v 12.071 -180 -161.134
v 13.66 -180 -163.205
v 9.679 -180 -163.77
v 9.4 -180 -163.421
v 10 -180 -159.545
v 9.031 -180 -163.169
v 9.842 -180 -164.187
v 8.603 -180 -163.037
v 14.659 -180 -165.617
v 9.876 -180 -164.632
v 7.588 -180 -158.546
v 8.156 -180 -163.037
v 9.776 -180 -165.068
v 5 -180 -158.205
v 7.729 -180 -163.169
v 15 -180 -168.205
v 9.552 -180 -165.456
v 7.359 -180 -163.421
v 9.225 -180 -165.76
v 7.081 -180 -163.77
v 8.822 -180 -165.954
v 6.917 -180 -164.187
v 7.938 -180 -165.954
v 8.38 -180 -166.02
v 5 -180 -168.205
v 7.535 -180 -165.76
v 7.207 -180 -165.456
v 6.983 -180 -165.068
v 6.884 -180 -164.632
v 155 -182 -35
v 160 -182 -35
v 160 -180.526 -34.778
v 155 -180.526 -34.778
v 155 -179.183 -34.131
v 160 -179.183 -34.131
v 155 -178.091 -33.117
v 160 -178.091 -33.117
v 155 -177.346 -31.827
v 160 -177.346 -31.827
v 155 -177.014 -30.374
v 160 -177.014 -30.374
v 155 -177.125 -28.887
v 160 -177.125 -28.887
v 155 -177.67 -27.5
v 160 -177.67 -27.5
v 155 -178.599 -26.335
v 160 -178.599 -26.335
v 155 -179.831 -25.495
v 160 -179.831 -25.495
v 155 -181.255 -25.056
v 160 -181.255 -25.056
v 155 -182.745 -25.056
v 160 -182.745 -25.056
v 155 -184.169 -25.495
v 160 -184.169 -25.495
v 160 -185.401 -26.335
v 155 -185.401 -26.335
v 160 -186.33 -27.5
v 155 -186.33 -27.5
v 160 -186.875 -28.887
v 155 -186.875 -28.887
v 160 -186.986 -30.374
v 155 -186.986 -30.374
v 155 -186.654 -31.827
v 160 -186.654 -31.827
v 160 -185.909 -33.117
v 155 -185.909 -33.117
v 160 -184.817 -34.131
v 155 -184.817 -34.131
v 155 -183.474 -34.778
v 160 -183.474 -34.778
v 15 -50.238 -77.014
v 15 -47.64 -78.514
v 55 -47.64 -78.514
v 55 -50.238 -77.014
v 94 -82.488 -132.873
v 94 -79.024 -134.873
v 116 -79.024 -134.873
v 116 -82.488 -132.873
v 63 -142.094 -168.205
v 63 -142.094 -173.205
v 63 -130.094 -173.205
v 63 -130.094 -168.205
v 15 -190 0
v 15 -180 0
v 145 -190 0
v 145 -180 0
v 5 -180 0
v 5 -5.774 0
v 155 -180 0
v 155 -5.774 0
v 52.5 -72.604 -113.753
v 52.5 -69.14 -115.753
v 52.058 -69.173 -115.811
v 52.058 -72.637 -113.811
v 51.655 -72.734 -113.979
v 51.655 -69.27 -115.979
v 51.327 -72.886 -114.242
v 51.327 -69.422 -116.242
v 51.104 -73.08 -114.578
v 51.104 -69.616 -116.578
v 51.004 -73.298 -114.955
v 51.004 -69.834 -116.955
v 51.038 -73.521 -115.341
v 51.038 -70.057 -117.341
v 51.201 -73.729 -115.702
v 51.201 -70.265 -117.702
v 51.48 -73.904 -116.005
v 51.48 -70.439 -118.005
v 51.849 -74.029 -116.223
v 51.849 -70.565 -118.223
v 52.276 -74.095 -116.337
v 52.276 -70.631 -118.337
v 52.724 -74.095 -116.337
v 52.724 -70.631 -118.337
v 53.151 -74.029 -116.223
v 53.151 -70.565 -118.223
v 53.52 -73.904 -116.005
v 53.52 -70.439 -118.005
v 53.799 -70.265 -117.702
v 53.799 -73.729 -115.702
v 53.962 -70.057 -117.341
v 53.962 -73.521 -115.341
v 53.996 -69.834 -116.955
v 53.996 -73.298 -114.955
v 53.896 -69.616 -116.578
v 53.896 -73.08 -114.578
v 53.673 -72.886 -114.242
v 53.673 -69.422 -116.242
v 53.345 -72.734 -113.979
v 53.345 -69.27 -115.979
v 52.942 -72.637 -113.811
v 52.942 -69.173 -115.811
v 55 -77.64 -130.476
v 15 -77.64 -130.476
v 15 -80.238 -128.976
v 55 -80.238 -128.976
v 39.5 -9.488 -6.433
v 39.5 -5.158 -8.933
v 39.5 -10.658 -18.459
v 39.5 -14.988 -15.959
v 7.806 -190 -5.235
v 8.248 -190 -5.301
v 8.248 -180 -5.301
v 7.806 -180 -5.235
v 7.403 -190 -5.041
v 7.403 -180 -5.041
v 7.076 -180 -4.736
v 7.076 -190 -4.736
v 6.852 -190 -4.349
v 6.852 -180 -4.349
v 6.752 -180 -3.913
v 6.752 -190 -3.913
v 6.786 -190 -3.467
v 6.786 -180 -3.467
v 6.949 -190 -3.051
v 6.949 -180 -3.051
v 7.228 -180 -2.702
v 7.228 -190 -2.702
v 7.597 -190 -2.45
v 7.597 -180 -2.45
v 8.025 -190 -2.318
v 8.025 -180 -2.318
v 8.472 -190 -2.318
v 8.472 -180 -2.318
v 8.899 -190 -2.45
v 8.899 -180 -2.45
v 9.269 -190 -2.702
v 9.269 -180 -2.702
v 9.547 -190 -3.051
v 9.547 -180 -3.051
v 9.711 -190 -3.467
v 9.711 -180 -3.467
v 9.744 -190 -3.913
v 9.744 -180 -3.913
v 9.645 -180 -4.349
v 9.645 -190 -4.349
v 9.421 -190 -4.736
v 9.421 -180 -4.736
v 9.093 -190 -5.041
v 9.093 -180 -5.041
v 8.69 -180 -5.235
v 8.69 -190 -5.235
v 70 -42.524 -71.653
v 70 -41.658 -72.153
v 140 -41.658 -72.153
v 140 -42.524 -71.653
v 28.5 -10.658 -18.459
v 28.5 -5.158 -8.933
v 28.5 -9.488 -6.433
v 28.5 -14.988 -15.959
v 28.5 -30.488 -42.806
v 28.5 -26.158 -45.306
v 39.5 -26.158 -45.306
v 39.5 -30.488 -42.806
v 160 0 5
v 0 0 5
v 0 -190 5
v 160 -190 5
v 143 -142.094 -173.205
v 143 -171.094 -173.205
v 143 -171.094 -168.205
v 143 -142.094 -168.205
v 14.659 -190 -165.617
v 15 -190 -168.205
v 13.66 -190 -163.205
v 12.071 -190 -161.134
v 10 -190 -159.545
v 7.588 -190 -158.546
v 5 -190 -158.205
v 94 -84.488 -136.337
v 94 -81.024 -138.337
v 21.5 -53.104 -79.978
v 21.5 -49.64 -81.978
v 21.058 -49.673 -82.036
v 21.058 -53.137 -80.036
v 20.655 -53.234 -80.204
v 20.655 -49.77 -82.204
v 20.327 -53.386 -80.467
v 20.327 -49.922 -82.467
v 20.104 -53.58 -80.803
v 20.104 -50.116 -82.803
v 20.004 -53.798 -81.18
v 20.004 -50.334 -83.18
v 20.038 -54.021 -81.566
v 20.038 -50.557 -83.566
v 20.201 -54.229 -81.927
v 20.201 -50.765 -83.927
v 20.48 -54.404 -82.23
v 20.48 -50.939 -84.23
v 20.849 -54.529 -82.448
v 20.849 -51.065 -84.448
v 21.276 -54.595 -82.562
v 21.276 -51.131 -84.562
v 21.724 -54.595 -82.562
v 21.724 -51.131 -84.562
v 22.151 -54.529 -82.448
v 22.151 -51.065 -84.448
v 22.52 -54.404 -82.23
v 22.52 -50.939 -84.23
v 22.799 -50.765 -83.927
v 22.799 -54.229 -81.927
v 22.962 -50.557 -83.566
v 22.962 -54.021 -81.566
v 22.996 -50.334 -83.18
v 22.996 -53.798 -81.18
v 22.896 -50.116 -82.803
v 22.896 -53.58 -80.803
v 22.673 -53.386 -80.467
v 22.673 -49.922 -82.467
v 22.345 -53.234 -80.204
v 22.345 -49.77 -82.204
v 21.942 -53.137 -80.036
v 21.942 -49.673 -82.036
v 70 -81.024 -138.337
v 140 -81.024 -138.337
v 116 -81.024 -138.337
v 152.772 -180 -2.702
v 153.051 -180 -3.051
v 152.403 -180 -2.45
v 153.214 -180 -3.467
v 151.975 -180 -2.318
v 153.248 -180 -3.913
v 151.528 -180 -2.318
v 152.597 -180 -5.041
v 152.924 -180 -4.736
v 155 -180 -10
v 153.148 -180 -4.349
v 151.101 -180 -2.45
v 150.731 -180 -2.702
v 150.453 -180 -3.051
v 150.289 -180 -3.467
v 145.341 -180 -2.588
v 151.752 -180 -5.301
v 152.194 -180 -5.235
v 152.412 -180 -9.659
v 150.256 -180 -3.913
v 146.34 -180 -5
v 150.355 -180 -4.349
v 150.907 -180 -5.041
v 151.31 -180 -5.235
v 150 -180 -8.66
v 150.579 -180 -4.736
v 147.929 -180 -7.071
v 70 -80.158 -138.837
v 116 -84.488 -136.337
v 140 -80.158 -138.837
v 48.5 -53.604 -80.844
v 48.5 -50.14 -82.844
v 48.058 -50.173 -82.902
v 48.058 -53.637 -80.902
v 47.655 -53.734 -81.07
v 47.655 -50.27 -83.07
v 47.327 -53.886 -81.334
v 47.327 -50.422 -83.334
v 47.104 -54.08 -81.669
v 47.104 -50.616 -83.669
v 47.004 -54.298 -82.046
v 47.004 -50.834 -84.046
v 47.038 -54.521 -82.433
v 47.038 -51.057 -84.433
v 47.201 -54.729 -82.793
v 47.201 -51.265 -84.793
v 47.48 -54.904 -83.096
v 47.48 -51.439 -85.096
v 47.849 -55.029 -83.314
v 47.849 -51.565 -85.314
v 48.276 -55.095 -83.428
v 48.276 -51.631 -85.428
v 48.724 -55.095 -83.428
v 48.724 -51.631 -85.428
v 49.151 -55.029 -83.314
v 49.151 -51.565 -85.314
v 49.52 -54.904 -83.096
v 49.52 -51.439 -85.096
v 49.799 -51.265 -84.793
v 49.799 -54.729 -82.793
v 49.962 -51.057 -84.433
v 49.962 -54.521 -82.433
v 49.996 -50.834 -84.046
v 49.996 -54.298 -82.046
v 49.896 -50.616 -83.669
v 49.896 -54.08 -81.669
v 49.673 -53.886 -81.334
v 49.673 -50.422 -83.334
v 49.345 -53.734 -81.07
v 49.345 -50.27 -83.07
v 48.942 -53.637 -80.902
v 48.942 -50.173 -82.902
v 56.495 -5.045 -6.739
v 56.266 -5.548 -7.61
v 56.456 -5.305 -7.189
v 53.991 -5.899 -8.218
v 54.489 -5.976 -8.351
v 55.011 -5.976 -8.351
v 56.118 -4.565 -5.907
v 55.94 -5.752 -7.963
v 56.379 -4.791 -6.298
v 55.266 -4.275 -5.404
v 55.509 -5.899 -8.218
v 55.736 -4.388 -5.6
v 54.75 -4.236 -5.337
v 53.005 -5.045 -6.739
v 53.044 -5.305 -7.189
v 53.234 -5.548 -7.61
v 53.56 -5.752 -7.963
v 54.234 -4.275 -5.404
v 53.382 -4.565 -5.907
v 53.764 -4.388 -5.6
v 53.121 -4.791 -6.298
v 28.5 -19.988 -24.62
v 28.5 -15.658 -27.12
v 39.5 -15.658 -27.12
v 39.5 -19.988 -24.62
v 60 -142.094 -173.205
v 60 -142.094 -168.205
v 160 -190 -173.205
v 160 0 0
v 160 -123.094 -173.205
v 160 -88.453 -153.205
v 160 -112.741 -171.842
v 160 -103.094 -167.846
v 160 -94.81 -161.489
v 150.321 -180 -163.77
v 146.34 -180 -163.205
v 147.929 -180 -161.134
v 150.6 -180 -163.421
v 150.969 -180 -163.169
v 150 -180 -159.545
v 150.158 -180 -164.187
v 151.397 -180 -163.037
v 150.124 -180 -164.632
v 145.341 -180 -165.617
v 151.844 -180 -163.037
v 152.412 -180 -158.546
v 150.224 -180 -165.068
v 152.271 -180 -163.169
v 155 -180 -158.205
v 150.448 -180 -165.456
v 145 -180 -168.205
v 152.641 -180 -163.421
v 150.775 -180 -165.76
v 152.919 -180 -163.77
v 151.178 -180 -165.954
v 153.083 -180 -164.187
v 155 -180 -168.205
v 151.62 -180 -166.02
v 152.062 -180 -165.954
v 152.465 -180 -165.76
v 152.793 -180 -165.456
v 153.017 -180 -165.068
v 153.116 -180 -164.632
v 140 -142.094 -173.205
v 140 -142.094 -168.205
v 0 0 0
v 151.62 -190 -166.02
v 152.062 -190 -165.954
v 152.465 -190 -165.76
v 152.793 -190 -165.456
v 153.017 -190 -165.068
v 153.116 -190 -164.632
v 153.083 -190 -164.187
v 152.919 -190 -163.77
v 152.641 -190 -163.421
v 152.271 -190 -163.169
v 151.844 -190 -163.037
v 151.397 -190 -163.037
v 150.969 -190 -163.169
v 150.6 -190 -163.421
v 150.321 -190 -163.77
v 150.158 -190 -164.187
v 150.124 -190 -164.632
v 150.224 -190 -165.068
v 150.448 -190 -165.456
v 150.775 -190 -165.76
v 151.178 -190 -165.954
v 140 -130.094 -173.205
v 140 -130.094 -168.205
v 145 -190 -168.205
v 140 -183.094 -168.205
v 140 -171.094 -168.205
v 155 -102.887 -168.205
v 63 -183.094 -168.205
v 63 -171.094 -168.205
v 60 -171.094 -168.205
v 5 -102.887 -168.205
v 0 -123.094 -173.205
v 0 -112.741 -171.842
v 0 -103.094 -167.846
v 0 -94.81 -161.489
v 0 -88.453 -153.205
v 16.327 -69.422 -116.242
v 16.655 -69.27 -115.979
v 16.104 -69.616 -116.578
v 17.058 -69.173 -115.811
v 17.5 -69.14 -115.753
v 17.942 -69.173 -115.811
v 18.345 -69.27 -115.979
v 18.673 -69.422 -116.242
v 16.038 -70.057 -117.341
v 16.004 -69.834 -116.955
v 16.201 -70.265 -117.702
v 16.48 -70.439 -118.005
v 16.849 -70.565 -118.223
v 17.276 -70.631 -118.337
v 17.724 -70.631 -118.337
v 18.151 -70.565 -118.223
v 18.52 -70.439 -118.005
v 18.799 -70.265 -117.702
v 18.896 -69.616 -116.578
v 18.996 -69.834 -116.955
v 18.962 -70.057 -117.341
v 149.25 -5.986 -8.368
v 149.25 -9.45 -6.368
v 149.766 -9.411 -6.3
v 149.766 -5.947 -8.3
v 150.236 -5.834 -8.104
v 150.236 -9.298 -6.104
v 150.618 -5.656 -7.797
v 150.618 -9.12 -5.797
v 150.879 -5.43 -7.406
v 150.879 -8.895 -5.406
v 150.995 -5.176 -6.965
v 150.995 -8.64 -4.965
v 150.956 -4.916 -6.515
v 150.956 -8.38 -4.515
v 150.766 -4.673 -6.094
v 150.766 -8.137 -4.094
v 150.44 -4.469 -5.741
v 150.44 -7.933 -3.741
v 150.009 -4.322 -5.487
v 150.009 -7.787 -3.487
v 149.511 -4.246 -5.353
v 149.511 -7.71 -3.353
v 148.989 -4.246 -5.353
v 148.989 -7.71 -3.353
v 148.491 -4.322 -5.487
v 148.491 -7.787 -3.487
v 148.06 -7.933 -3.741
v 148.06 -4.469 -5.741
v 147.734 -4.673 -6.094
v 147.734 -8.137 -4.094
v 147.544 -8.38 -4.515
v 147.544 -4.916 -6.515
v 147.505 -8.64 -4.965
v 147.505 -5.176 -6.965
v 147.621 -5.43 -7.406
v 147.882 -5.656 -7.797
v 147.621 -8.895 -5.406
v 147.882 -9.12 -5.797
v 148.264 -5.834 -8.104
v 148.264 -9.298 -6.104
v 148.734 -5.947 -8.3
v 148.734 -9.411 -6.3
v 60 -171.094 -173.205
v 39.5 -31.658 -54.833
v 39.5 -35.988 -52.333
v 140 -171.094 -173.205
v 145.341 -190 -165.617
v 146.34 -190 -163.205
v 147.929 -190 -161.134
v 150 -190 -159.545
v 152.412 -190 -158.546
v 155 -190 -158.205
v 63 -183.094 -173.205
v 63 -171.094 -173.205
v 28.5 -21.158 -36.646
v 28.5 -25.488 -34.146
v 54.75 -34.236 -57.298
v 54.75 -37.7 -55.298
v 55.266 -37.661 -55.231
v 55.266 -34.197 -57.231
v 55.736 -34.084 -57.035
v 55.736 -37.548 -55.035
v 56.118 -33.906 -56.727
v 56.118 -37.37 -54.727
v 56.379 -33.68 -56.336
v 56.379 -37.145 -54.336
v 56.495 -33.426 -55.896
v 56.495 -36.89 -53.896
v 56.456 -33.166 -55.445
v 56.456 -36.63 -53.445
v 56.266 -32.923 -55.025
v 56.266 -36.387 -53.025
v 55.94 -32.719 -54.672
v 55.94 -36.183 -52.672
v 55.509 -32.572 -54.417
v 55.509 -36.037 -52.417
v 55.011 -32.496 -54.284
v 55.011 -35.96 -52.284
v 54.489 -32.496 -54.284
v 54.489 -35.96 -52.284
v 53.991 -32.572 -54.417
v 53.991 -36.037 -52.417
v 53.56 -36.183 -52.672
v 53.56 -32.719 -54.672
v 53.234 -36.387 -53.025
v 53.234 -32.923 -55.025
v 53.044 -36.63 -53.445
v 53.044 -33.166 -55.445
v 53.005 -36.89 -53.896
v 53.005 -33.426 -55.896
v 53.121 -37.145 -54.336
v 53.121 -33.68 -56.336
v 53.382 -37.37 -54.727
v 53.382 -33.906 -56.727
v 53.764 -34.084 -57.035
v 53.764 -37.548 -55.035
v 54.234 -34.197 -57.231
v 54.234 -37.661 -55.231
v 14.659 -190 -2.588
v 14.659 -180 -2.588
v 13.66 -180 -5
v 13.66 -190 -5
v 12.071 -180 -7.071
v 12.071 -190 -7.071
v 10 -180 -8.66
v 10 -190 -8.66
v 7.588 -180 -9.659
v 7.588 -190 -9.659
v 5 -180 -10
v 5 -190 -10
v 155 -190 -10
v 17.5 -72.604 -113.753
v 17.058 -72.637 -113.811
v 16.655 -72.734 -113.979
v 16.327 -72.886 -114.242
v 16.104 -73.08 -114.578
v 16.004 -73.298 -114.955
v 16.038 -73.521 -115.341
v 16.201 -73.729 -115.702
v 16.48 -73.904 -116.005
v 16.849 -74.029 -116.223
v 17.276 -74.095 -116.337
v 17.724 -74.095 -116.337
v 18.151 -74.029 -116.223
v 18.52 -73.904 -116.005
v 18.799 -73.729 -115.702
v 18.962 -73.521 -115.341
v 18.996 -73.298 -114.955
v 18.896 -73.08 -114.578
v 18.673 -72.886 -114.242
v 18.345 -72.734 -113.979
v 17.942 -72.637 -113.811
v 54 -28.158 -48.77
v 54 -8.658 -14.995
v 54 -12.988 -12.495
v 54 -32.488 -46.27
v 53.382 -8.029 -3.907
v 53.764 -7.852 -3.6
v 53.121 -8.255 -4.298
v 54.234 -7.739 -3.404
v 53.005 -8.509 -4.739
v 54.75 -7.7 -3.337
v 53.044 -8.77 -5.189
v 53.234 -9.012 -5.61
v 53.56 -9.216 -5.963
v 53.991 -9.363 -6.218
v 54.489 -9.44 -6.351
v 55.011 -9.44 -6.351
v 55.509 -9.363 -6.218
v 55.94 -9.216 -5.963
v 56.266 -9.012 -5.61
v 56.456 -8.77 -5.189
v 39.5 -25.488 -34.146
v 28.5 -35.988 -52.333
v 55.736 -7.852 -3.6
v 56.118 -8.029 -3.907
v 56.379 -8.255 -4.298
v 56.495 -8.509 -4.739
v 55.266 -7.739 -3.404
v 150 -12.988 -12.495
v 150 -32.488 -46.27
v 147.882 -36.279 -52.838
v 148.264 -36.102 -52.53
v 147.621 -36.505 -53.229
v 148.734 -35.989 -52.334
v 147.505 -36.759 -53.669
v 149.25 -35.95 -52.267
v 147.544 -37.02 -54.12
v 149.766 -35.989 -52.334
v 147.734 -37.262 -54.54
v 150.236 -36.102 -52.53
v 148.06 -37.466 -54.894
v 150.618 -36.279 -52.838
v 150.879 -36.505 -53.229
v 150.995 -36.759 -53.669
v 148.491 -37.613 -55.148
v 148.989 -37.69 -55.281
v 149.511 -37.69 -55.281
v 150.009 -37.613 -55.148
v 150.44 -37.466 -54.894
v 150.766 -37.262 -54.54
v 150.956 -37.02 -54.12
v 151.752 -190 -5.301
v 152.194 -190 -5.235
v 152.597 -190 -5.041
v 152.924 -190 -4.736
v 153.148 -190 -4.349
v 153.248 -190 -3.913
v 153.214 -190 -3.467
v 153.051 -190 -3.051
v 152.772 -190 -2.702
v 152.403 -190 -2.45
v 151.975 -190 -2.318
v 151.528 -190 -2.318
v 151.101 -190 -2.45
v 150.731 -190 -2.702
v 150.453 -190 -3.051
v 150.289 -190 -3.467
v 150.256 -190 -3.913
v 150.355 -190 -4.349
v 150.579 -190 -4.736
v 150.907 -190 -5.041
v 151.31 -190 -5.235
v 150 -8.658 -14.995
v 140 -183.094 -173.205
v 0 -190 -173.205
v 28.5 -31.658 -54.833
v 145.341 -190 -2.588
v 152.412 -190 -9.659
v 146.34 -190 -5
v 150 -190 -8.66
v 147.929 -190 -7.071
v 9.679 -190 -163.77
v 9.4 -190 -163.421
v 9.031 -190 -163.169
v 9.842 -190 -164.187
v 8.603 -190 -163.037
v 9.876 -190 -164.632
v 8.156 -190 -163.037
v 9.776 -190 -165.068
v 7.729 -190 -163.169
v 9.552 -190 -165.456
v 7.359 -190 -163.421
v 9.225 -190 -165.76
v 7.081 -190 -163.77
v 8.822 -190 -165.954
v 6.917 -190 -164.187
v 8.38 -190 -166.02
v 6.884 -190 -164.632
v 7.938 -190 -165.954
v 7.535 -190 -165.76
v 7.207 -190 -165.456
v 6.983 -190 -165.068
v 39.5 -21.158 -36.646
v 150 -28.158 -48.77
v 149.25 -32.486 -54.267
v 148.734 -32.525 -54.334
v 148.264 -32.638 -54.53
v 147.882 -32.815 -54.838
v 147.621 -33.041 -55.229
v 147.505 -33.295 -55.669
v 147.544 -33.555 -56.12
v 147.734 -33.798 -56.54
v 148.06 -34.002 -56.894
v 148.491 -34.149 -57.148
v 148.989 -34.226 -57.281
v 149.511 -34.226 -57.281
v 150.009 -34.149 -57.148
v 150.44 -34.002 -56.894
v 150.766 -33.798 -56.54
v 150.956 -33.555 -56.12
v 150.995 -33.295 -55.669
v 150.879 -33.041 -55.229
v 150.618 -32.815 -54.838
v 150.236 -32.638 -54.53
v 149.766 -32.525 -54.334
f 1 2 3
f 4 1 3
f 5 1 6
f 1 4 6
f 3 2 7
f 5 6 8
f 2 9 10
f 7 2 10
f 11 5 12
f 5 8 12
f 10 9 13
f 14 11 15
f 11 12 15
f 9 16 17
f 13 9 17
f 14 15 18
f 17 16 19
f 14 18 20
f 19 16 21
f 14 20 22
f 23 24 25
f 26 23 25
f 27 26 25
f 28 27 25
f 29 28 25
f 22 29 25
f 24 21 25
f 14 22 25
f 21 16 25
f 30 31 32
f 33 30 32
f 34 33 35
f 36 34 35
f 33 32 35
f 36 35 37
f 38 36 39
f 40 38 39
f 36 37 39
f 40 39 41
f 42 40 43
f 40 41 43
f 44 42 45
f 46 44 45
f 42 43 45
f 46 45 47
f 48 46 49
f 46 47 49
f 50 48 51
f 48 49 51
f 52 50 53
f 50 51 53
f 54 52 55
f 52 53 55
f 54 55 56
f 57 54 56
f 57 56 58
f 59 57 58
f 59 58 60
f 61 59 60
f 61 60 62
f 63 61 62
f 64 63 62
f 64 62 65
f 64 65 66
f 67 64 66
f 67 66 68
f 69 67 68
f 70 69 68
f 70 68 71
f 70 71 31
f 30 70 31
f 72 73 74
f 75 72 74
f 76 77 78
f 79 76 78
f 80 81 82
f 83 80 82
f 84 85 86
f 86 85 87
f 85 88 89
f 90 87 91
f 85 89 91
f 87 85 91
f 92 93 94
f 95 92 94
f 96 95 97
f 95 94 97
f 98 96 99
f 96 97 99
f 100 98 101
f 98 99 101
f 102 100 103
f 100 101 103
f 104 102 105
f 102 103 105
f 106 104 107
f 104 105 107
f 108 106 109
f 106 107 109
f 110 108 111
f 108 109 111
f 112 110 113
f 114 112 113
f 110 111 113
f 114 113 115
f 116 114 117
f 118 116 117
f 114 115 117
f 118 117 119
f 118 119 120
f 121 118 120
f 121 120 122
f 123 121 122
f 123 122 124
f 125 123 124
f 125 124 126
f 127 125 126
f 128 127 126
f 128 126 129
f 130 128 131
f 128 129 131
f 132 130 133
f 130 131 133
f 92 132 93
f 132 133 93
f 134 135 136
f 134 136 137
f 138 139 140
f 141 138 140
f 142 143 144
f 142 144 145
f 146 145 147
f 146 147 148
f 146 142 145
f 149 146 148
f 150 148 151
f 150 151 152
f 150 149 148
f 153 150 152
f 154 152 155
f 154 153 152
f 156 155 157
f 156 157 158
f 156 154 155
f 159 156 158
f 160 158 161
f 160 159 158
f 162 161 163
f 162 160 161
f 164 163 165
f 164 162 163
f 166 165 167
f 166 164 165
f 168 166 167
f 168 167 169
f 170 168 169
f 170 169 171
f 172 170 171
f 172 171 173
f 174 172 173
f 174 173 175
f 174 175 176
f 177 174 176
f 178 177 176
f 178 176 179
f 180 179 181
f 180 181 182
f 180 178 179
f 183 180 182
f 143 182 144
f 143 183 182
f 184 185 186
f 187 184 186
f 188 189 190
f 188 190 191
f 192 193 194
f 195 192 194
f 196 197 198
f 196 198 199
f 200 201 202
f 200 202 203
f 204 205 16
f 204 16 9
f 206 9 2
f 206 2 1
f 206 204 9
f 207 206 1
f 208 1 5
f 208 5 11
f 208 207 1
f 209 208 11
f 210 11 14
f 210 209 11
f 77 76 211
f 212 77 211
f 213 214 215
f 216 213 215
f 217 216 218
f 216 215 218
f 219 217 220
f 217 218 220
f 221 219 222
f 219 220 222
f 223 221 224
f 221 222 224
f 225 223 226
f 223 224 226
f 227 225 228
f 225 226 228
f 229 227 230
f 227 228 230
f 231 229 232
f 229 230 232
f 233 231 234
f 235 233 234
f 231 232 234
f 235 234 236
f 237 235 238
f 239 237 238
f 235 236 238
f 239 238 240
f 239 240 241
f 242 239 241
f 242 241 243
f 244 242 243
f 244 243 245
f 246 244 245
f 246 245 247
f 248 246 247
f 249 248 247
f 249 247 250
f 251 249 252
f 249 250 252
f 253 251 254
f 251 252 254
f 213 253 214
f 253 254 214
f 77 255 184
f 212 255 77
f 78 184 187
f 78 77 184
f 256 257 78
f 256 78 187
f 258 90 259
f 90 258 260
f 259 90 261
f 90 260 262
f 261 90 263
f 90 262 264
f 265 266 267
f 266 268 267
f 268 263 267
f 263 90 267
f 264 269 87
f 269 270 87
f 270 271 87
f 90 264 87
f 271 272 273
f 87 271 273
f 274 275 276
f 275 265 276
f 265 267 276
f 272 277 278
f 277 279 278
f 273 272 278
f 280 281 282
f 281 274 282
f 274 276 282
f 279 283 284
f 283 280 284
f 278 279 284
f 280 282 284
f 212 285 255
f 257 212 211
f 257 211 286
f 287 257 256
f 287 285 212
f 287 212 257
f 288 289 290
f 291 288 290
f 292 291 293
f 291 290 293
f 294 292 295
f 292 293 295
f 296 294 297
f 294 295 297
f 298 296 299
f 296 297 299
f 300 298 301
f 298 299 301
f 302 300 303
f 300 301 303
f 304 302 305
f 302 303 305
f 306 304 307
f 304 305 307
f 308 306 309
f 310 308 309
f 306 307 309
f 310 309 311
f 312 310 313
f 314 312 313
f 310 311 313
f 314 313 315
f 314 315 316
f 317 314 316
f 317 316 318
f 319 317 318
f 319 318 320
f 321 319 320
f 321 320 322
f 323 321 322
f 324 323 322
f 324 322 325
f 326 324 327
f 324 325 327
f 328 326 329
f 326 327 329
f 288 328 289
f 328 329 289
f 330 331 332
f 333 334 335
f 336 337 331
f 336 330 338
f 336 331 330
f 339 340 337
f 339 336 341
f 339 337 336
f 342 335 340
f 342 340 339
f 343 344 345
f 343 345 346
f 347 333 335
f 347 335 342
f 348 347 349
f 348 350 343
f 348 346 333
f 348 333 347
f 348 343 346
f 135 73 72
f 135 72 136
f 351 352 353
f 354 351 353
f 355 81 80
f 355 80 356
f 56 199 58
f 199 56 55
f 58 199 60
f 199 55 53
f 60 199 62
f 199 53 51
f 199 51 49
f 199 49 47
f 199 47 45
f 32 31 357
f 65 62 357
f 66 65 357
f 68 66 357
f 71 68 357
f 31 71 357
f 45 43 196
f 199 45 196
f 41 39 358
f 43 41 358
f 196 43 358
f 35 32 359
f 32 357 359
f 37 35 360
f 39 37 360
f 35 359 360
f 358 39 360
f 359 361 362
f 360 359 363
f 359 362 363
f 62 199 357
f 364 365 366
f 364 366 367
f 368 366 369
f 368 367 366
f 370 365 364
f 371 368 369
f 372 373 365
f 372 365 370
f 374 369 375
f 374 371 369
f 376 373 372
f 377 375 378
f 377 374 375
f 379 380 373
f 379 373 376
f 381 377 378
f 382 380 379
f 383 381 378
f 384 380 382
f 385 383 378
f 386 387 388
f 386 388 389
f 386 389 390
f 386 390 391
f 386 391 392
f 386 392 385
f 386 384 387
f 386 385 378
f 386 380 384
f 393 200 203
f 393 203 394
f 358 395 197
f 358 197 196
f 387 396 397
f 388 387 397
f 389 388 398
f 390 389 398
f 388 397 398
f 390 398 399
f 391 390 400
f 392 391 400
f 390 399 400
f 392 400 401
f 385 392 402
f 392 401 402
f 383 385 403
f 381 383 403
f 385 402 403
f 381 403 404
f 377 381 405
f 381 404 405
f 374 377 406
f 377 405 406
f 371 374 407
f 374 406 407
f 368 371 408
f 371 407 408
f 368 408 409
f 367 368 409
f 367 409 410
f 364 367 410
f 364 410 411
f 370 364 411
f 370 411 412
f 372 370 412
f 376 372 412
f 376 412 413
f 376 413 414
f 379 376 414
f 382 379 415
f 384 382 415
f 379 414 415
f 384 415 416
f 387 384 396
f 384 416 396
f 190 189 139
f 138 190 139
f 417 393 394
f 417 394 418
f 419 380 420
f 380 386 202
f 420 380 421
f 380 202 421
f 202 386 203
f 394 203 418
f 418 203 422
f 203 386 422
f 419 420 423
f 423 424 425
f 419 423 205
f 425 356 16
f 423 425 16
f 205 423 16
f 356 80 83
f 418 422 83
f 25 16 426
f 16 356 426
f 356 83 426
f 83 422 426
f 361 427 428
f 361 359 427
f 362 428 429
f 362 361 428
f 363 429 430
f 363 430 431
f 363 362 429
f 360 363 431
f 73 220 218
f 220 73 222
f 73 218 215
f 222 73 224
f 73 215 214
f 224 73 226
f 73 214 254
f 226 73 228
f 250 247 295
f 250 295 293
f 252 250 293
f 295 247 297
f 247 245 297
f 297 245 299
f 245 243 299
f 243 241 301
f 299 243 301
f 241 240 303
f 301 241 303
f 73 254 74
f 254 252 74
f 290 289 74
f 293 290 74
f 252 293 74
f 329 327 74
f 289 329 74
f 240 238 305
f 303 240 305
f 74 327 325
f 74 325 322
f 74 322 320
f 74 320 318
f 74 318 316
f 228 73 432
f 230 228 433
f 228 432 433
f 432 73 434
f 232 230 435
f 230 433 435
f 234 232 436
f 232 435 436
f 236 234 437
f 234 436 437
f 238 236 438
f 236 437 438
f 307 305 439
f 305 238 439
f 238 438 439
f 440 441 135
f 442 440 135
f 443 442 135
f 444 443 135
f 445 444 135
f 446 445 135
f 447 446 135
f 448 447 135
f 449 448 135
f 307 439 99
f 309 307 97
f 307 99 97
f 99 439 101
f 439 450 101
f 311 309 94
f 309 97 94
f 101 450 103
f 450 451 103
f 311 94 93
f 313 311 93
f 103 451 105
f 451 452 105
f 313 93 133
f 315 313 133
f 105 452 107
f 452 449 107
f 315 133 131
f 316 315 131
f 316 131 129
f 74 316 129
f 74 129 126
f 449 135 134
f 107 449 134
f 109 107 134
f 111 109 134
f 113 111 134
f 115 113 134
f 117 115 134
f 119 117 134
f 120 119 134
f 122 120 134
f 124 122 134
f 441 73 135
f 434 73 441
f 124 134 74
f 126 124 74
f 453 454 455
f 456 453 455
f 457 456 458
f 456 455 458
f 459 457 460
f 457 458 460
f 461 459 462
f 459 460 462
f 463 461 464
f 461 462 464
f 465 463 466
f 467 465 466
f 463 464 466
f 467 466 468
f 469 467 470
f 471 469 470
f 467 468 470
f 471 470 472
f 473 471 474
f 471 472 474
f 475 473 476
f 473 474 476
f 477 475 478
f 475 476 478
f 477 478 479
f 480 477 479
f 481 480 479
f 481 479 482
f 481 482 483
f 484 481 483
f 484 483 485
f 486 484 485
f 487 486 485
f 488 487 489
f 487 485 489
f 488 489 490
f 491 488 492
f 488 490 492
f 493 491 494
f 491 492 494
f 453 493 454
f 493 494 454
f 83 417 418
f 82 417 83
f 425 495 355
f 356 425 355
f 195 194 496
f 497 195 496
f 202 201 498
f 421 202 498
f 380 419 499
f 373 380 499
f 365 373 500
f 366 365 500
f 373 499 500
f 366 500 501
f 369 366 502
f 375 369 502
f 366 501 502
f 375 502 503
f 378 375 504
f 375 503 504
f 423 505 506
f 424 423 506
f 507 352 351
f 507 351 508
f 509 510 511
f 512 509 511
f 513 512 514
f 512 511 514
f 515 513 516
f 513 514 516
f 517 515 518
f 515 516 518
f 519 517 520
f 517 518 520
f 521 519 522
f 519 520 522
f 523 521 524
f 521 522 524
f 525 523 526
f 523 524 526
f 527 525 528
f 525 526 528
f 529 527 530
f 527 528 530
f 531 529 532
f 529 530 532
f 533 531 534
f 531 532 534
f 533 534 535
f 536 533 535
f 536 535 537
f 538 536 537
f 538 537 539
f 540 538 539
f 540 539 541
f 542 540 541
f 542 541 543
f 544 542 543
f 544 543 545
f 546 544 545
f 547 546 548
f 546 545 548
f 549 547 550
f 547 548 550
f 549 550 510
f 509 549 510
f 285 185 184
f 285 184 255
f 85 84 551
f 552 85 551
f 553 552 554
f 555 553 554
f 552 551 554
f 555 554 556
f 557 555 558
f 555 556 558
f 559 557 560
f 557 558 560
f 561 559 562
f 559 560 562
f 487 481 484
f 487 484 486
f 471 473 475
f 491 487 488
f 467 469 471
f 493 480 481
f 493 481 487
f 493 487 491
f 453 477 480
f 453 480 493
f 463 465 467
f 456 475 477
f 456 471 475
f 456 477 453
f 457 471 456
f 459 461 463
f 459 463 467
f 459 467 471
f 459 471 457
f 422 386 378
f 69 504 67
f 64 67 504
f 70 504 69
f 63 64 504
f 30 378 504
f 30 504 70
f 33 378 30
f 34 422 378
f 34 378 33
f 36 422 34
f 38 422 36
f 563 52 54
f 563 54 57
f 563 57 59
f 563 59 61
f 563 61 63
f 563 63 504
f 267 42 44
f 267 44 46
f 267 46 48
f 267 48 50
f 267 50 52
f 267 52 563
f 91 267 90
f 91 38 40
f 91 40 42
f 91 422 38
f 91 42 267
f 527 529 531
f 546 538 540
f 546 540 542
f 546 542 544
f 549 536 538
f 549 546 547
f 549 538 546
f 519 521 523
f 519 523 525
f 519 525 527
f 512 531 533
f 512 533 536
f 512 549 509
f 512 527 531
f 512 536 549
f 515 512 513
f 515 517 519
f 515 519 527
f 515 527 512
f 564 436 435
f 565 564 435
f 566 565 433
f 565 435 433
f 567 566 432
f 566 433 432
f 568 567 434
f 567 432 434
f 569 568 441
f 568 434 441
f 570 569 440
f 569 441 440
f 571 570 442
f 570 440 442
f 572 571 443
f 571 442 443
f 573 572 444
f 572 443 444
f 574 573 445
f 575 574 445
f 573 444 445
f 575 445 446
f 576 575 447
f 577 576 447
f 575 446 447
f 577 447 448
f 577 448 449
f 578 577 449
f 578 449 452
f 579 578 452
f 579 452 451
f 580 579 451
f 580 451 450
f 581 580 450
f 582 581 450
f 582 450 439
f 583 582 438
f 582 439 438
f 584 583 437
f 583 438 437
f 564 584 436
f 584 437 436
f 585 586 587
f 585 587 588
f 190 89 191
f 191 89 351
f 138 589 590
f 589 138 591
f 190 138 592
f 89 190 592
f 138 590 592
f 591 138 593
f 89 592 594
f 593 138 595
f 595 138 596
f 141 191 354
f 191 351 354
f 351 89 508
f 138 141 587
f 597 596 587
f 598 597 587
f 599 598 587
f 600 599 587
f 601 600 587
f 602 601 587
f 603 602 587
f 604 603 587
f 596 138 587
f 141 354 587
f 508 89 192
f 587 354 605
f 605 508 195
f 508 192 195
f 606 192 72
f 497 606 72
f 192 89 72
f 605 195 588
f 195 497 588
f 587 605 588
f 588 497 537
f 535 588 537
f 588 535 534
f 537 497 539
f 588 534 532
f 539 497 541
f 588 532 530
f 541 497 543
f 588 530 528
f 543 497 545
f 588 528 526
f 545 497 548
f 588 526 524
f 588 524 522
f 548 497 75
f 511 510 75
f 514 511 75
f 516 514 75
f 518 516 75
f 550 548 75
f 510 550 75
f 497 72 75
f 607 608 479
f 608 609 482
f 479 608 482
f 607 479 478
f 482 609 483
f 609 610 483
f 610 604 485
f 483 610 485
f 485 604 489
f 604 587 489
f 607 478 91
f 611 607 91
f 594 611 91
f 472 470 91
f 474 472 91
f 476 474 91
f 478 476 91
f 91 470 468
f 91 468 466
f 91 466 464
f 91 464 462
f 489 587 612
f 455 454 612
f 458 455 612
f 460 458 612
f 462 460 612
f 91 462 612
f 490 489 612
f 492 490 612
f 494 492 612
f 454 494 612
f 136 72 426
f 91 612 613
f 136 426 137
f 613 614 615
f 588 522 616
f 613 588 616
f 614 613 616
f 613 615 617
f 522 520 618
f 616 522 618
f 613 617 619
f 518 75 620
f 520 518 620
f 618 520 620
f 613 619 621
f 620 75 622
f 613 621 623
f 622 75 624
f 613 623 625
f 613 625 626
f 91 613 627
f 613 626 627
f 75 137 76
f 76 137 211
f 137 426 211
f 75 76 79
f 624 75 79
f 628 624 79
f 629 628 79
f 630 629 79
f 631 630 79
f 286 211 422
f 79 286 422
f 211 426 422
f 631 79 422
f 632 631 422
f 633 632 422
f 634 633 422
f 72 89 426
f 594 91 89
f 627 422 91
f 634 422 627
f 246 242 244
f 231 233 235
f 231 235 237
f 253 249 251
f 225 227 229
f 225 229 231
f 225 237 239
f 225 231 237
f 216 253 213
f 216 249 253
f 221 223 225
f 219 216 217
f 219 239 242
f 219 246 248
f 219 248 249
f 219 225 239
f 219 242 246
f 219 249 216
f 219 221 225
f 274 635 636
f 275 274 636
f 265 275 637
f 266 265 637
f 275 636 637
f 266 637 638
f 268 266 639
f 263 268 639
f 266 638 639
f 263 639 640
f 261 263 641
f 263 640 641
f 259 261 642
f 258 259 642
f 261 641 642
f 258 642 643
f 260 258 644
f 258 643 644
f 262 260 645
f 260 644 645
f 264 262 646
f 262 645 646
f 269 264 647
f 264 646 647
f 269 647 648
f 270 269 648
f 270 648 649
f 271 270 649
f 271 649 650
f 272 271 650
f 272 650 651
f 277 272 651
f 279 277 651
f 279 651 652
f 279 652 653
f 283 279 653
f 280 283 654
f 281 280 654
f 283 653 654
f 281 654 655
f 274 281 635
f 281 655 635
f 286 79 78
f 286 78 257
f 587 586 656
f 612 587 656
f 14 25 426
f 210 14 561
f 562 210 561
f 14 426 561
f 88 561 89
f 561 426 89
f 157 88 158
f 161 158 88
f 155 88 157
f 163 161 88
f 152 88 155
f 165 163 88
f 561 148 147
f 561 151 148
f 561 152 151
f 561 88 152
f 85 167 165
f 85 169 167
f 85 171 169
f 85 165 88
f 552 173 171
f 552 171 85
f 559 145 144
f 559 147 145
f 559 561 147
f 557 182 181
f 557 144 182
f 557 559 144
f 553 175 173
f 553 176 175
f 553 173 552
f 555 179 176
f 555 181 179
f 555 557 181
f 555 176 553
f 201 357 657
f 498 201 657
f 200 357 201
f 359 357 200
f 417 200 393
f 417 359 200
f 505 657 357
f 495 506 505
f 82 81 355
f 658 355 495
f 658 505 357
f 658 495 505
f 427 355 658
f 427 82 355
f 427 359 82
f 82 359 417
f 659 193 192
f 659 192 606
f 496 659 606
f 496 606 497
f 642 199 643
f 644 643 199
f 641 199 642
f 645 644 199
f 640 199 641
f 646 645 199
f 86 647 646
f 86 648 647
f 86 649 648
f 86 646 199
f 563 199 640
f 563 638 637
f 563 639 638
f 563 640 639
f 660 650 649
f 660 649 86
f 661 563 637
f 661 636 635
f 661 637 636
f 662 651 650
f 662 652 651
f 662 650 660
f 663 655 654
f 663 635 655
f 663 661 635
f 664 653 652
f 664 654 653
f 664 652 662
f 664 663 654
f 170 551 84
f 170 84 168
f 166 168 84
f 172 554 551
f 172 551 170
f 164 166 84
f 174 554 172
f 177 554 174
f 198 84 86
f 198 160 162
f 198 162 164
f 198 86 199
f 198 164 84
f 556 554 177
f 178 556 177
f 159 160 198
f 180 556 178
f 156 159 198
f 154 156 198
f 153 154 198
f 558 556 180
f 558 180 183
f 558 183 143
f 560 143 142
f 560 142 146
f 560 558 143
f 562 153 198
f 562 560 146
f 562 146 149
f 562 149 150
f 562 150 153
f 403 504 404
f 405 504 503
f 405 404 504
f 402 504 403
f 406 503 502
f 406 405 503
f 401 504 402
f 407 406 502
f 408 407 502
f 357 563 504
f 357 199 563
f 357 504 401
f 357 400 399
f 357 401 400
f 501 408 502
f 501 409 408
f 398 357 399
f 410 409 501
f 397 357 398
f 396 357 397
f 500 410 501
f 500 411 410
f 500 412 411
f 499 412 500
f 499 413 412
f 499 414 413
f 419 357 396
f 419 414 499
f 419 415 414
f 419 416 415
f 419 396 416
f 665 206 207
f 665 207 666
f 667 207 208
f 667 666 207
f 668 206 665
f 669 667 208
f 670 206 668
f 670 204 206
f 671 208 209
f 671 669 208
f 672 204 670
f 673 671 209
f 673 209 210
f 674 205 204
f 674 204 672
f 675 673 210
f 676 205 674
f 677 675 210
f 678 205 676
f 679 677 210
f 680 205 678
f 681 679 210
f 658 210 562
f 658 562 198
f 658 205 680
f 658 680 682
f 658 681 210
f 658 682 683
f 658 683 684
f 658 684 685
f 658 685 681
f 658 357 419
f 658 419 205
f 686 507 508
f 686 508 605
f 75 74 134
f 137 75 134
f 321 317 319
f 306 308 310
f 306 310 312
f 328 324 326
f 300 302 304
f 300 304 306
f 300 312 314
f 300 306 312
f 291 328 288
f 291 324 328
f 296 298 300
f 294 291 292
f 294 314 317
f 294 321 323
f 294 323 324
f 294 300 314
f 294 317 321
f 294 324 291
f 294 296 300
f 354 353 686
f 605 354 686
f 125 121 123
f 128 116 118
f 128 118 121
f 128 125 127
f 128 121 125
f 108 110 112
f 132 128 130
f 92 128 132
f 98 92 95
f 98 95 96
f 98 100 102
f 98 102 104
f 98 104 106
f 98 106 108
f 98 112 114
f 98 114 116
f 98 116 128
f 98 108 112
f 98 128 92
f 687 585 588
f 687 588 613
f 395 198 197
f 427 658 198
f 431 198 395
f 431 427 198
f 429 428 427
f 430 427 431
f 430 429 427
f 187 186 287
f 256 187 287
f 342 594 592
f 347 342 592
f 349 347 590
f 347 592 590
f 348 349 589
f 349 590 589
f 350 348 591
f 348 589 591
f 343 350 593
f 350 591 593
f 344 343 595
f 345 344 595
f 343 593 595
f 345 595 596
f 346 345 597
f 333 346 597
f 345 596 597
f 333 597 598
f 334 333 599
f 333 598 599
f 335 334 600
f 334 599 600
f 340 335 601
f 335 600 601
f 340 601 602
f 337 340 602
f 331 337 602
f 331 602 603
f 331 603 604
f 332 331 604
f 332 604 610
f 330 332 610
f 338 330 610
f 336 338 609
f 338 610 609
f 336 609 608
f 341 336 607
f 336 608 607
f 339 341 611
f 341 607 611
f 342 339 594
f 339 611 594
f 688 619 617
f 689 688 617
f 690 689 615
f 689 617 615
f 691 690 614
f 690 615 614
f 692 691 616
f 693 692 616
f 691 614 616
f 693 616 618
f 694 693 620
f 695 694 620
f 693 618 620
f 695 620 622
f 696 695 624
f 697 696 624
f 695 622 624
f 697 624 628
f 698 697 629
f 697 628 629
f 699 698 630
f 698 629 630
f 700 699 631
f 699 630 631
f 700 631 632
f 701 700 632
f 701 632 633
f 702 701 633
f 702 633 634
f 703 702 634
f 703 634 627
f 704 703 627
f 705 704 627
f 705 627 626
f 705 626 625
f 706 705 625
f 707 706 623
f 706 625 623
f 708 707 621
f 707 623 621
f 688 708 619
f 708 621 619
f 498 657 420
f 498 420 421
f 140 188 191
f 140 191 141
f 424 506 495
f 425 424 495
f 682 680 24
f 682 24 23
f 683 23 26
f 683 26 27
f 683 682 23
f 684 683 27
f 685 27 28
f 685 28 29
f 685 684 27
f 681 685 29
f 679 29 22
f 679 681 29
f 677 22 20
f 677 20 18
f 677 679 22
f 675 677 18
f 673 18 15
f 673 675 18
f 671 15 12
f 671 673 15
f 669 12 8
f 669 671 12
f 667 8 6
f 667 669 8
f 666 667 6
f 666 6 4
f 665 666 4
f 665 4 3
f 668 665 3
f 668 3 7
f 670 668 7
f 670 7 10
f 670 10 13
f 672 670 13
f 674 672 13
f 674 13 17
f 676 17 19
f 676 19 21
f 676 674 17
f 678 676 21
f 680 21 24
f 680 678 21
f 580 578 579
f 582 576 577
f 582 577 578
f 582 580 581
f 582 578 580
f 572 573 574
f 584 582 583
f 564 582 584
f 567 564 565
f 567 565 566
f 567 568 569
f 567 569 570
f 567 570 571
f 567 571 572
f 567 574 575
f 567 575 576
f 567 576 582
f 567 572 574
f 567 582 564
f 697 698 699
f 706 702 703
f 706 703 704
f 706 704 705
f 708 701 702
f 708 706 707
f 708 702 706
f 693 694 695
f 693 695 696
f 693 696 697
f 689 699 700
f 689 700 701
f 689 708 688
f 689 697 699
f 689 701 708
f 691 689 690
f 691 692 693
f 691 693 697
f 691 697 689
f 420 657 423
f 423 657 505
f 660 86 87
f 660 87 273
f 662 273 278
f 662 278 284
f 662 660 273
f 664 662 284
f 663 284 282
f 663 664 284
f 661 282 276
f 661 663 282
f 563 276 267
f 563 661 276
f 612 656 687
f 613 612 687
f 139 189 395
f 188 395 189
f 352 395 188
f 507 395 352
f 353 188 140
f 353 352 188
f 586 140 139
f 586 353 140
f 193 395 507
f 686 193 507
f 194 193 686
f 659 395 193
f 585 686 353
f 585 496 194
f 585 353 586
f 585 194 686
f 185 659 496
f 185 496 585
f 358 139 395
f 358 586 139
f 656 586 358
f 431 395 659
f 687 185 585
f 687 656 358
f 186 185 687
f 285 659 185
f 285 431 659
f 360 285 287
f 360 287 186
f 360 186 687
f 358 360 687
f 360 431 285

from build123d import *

# Parameters (mm, degrees)
BOSS_EXTRUDE1_DEPTH  = 5
SKETCH2_W            = 160
SKETCH2_H            = 200
BOSS_EXTRUDE2_DEPTH  = 5
SKETCH4_W            = 160
SKETCH4_H            = 190
BOSS_EXTRUDE4_DEPTH  = 5
SKETCH5_W            = 160
SKETCH5_H            = 90
BOSS_EXTRUDE5_DEPTH  = 5
SKETCH6_W            = 96
SKETCH6_H            = 39
SKETCH6_W_2          = 11
SKETCH6_H_2          = 11
CUT_EXTRUDE2_DEPTH   = 5
FILLET1_R            = 40
SKETCH7_W            = 70
SKETCH7_H            = 77
CUT_EXTRUDE3_DEPTH   = 1
SKETCH8_W            = 22
SKETCH8_H            = 4
CUT_EXTRUDE4_DEPTH   = 4
SKETCH9_W            = 40
SKETCH9_H            = 60
CUT_EXTRUDE5_DEPTH   = 5
SKETCH12_W           = 40
SKETCH12_H           = 60
BOSS_EXTRUDE6_DEPTH  = 2
SKETCH14_W           = 77
SKETCH14_H           = 53
CUT_EXTRUDE6_DEPTH   = 5
SKETCH15_W           = 3
SKETCH15_H           = 29
CUT_EXTRUDE7_DEPTH   = 5
SKETCH17_R           = 1.75
CUT_EXTRUDE9_DEPTH   = 4
SKETCH21_R           = 1.5
BOSS_EXTRUDE8_DEPTH  = 4
SKETCH23_R           = 1.5
BOSS_EXTRUDE9_DEPTH  = 10
SKETCH25_R           = 1.5
BOSS_EXTRUDE10_DEPTH = 10
SKETCH33_R           = 5
CUT_EXTRUDE14_DEPTH  = 10


with BuildPart() as part:
    # Sketch1 → Boss-Extrude1 (new body)
    with BuildSketch(Plane(origin=(0, 0, 0), x_dir=(0, 0, -1), z_dir=(1, 0, 0))):
        Polygon((0, 0), (173.205080757, -100), (173.205080757, -190), (0, -190), align=None)
    boss_extrude1 = extrude(amount=BOSS_EXTRUDE1_DEPTH)

    # Sketch2 → Boss-Extrude2 (add)
    with BuildSketch(Plane(origin=(0, 0, 0), x_dir=(1, 0, 0), z_dir=(0, 0.8660254037844382, -0.5000000000000011))):
        with Locations((80, 100)):
            Rectangle(SKETCH2_W, SKETCH2_H)
    extrude(amount=-BOSS_EXTRUDE2_DEPTH)

    # Sketch4 → Boss-Extrude4 (add)
    with BuildSketch(Plane.XY):
        with Locations((80, -95)):
            Rectangle(SKETCH4_W, SKETCH4_H)
    extrude(amount=BOSS_EXTRUDE4_DEPTH)

    # Sketch5 → Boss-Extrude5 (add)
    with BuildSketch(Plane(origin=(0, 0, -173.205080757), x_dir=(-1, 0, 0), z_dir=(0, 0, -1))):
        with Locations((-80, -145)):
            Rectangle(SKETCH5_W, SKETCH5_H)
    extrude(amount=-BOSS_EXTRUDE5_DEPTH)

    # Mirror1: Boss-Extrude1 across plane
    add(boss_extrude1.mirror(Plane.ZY.offset(-80)))

    # Sketch6 → Cut-Extrude2 (cut)
    with BuildSketch(Plane(origin=(0, 0, 0), x_dir=(1, 0, 0), z_dir=(0, 0.8660254037844382, -0.5000000000000011))):
        with Locations((102, 36.815172727)):
            Rectangle(SKETCH6_W, SKETCH6_H)
        with Locations((34, 15.815172727)):
            Rectangle(SKETCH6_W_2, SKETCH6_H_2)
        with Locations((34, 36.815172727)):
            Rectangle(SKETCH6_W_2, SKETCH6_H_2)
        with Locations((34, 57.815172727)):
            Rectangle(SKETCH6_W_2, SKETCH6_H_2)
    extrude(amount=-CUT_EXTRUDE2_DEPTH, mode=Mode.SUBTRACT)

    # Fillet1
    fillet1_edges = [part.edges().sort_by_distance(p)[0] for p in [
        (80, -100, -173.205080757),
    ]]
    fillet(fillet1_edges, radius=FILLET1_R)

    # Sketch7 → Cut-Extrude3 (cut)
    with BuildSketch(Plane(origin=(0, 0, 0), x_dir=(1, 0, 0), z_dir=(0, 0.8660254037844382, -0.5000000000000011))):
        with Locations((105, 121.815172727)):
            Rectangle(SKETCH7_W, SKETCH7_H)
    extrude(amount=-CUT_EXTRUDE3_DEPTH, mode=Mode.SUBTRACT)

    # Sketch8 → Cut-Extrude4 (cut)
    with BuildSketch(Plane(origin=(0, -0.866025403784426, 0.4999999999999943), x_dir=(1, 0, 0), z_dir=(0, 0.8660254037844382, -0.5000000000000011))):
        with Locations((105, 158.315172727)):
            Rectangle(SKETCH8_W, SKETCH8_H)
    extrude(amount=-CUT_EXTRUDE4_DEPTH, mode=Mode.SUBTRACT)

    # Sketch9 → Cut-Extrude5 (cut)
    with BuildSketch(Plane(origin=(0, 0, 0), x_dir=(1, 0, 0), z_dir=(0, 0.8660254037844382, -0.5000000000000011))):
        with Locations((35, 121.815172727)):
            Rectangle(SKETCH9_W, SKETCH9_H)
    extrude(amount=-CUT_EXTRUDE5_DEPTH, mode=Mode.SUBTRACT)

    # Sketch12 → Boss-Extrude6 (add)
    with BuildSketch(Plane(origin=(0, 0, 0), x_dir=(1, 0, 0), z_dir=(0, 0.8660254037844382, -0.5000000000000011))):
        with Locations((35, 121.815172727)):
            Rectangle(SKETCH12_W, SKETCH12_H)
    extrude(amount=-BOSS_EXTRUDE6_DEPTH)

    # Sketch14 → Cut-Extrude6 (cut)
    with BuildSketch(Plane(origin=(0, 0, -173.205080757), x_dir=(-1, 0, 0), z_dir=(0, 0, -1))):
        with Locations((-101.5, -156.594010768)):
            Rectangle(SKETCH14_W, SKETCH14_H)
    extrude(amount=-CUT_EXTRUDE6_DEPTH, mode=Mode.SUBTRACT)

    # Sketch15 → Cut-Extrude7 (cut)
    with BuildSketch(Plane(origin=(0, 0, -173.205080757), x_dir=(-1, 0, 0), z_dir=(0, 0, -1))):
        with Locations((-61.5, -156.594010768)):
            Rectangle(SKETCH15_W, SKETCH15_H)
        with Locations((-141.5, -156.594010768)):
            Rectangle(SKETCH15_W, SKETCH15_H)
    extrude(amount=-CUT_EXTRUDE7_DEPTH, mode=Mode.SUBTRACT)

    # Sketch17 → Cut-Extrude9 (cut)
    with BuildSketch(Plane(origin=(0, -4.330127019, 2.5), x_dir=(-1, 0, 0), z_dir=(0, -0.8660254037844382, 0.500000000000001))):
        with Locations(Location((-54.75, 64.989476433, 0), (0, 0, 90))):
            Circle(SKETCH17_R)
        with Locations(Location((-149.25, 64.989476433, 0), (0, 0, 270))):
            Circle(SKETCH17_R)
        with Locations(Location((-54.75, 8.489476433, 0), (0, 0, 270))):
            Circle(SKETCH17_R)
        with Locations(Location((-149.25, 8.489476433, 0), (0, 0, 90))):
            Circle(SKETCH17_R)
    extrude(amount=-CUT_EXTRUDE9_DEPTH, mode=Mode.SUBTRACT)

    # Sketch21 → Boss-Extrude8 (add)
    with BuildSketch(Plane(origin=(0, -1.732050808, 1), x_dir=(-1, 0, 0), z_dir=(0, -0.8660254037844382, 0.500000000000001))):
        with Locations(Location((-48.5, 98.315172727, 0), (0, 0, 270))):
            Circle(SKETCH21_R)
        with Locations(Location((-21.5, 97.315172727, 0), (0, 0, 270))):
            Circle(SKETCH21_R)
        with Locations(Location((-17.5, 136.315172727, 0), (0, 0, 270))):
            Circle(SKETCH21_R)
        with Locations(Location((-52.5, 136.315172727, 0), (0, 0, 270))):
            Circle(SKETCH21_R)
    extrude(amount=BOSS_EXTRUDE8_DEPTH)

    # Sketch23 → Boss-Extrude9 (add)
    with BuildSketch(Plane(origin=(0, -190, 0), x_dir=(-1, 0, 0), z_dir=(0, -1, 0))):
        with BuildLine():
            Line((-155, 0), (-145, 0))
            ThreePointArc((-145, 0), (-147.928932188, 7.071067812), (-155, 10))
            Line((-155, 10), (-155, 0))
        make_face()
        with Locations(Location((-151.751738587, 3.801157428, 0), (0, 0, 90))):
            Circle(SKETCH23_R, mode=Mode.SUBTRACT)
    boss_extrude9 = extrude(amount=-BOSS_EXTRUDE9_DEPTH)

    # Mirror2: Boss-Extrude9 across plane
    add(boss_extrude9.mirror(Plane.ZY.offset(-80)))

    # Sketch25 → Boss-Extrude10 (add)
    with BuildSketch(Plane(origin=(0, -190, 0), x_dir=(-1, 0, 0), z_dir=(0, -1, 0))):
        with BuildLine():
            Line((-155, 168.205080757), (-145, 168.205080757))
            ThreePointArc((-145, 168.205080757), (-147.928932188, 161.134012945), (-155, 158.205080757))
            Line((-155, 158.205080757), (-155, 168.205080757))
        make_face()
        with Locations(Location((-151.620258089, 164.520335906, 0), (0, 0, 90))):
            Circle(SKETCH25_R, mode=Mode.SUBTRACT)
    boss_extrude10 = extrude(amount=-BOSS_EXTRUDE10_DEPTH)

    # Mirror4: Boss-Extrude10 across plane
    add(boss_extrude10.mirror(Plane.ZY.offset(-80)))

    # Sketch33 → Cut-Extrude14 (cut)
    with BuildSketch(Plane(origin=(160, 0, 0), x_dir=(0, 0, -1), z_dir=(1, 0, 0))):
        with Locations((30, -182)):
            Circle(SKETCH33_R)
    extrude(amount=-CUT_EXTRUDE14_DEPTH, mode=Mode.SUBTRACT)


solid = part.part
